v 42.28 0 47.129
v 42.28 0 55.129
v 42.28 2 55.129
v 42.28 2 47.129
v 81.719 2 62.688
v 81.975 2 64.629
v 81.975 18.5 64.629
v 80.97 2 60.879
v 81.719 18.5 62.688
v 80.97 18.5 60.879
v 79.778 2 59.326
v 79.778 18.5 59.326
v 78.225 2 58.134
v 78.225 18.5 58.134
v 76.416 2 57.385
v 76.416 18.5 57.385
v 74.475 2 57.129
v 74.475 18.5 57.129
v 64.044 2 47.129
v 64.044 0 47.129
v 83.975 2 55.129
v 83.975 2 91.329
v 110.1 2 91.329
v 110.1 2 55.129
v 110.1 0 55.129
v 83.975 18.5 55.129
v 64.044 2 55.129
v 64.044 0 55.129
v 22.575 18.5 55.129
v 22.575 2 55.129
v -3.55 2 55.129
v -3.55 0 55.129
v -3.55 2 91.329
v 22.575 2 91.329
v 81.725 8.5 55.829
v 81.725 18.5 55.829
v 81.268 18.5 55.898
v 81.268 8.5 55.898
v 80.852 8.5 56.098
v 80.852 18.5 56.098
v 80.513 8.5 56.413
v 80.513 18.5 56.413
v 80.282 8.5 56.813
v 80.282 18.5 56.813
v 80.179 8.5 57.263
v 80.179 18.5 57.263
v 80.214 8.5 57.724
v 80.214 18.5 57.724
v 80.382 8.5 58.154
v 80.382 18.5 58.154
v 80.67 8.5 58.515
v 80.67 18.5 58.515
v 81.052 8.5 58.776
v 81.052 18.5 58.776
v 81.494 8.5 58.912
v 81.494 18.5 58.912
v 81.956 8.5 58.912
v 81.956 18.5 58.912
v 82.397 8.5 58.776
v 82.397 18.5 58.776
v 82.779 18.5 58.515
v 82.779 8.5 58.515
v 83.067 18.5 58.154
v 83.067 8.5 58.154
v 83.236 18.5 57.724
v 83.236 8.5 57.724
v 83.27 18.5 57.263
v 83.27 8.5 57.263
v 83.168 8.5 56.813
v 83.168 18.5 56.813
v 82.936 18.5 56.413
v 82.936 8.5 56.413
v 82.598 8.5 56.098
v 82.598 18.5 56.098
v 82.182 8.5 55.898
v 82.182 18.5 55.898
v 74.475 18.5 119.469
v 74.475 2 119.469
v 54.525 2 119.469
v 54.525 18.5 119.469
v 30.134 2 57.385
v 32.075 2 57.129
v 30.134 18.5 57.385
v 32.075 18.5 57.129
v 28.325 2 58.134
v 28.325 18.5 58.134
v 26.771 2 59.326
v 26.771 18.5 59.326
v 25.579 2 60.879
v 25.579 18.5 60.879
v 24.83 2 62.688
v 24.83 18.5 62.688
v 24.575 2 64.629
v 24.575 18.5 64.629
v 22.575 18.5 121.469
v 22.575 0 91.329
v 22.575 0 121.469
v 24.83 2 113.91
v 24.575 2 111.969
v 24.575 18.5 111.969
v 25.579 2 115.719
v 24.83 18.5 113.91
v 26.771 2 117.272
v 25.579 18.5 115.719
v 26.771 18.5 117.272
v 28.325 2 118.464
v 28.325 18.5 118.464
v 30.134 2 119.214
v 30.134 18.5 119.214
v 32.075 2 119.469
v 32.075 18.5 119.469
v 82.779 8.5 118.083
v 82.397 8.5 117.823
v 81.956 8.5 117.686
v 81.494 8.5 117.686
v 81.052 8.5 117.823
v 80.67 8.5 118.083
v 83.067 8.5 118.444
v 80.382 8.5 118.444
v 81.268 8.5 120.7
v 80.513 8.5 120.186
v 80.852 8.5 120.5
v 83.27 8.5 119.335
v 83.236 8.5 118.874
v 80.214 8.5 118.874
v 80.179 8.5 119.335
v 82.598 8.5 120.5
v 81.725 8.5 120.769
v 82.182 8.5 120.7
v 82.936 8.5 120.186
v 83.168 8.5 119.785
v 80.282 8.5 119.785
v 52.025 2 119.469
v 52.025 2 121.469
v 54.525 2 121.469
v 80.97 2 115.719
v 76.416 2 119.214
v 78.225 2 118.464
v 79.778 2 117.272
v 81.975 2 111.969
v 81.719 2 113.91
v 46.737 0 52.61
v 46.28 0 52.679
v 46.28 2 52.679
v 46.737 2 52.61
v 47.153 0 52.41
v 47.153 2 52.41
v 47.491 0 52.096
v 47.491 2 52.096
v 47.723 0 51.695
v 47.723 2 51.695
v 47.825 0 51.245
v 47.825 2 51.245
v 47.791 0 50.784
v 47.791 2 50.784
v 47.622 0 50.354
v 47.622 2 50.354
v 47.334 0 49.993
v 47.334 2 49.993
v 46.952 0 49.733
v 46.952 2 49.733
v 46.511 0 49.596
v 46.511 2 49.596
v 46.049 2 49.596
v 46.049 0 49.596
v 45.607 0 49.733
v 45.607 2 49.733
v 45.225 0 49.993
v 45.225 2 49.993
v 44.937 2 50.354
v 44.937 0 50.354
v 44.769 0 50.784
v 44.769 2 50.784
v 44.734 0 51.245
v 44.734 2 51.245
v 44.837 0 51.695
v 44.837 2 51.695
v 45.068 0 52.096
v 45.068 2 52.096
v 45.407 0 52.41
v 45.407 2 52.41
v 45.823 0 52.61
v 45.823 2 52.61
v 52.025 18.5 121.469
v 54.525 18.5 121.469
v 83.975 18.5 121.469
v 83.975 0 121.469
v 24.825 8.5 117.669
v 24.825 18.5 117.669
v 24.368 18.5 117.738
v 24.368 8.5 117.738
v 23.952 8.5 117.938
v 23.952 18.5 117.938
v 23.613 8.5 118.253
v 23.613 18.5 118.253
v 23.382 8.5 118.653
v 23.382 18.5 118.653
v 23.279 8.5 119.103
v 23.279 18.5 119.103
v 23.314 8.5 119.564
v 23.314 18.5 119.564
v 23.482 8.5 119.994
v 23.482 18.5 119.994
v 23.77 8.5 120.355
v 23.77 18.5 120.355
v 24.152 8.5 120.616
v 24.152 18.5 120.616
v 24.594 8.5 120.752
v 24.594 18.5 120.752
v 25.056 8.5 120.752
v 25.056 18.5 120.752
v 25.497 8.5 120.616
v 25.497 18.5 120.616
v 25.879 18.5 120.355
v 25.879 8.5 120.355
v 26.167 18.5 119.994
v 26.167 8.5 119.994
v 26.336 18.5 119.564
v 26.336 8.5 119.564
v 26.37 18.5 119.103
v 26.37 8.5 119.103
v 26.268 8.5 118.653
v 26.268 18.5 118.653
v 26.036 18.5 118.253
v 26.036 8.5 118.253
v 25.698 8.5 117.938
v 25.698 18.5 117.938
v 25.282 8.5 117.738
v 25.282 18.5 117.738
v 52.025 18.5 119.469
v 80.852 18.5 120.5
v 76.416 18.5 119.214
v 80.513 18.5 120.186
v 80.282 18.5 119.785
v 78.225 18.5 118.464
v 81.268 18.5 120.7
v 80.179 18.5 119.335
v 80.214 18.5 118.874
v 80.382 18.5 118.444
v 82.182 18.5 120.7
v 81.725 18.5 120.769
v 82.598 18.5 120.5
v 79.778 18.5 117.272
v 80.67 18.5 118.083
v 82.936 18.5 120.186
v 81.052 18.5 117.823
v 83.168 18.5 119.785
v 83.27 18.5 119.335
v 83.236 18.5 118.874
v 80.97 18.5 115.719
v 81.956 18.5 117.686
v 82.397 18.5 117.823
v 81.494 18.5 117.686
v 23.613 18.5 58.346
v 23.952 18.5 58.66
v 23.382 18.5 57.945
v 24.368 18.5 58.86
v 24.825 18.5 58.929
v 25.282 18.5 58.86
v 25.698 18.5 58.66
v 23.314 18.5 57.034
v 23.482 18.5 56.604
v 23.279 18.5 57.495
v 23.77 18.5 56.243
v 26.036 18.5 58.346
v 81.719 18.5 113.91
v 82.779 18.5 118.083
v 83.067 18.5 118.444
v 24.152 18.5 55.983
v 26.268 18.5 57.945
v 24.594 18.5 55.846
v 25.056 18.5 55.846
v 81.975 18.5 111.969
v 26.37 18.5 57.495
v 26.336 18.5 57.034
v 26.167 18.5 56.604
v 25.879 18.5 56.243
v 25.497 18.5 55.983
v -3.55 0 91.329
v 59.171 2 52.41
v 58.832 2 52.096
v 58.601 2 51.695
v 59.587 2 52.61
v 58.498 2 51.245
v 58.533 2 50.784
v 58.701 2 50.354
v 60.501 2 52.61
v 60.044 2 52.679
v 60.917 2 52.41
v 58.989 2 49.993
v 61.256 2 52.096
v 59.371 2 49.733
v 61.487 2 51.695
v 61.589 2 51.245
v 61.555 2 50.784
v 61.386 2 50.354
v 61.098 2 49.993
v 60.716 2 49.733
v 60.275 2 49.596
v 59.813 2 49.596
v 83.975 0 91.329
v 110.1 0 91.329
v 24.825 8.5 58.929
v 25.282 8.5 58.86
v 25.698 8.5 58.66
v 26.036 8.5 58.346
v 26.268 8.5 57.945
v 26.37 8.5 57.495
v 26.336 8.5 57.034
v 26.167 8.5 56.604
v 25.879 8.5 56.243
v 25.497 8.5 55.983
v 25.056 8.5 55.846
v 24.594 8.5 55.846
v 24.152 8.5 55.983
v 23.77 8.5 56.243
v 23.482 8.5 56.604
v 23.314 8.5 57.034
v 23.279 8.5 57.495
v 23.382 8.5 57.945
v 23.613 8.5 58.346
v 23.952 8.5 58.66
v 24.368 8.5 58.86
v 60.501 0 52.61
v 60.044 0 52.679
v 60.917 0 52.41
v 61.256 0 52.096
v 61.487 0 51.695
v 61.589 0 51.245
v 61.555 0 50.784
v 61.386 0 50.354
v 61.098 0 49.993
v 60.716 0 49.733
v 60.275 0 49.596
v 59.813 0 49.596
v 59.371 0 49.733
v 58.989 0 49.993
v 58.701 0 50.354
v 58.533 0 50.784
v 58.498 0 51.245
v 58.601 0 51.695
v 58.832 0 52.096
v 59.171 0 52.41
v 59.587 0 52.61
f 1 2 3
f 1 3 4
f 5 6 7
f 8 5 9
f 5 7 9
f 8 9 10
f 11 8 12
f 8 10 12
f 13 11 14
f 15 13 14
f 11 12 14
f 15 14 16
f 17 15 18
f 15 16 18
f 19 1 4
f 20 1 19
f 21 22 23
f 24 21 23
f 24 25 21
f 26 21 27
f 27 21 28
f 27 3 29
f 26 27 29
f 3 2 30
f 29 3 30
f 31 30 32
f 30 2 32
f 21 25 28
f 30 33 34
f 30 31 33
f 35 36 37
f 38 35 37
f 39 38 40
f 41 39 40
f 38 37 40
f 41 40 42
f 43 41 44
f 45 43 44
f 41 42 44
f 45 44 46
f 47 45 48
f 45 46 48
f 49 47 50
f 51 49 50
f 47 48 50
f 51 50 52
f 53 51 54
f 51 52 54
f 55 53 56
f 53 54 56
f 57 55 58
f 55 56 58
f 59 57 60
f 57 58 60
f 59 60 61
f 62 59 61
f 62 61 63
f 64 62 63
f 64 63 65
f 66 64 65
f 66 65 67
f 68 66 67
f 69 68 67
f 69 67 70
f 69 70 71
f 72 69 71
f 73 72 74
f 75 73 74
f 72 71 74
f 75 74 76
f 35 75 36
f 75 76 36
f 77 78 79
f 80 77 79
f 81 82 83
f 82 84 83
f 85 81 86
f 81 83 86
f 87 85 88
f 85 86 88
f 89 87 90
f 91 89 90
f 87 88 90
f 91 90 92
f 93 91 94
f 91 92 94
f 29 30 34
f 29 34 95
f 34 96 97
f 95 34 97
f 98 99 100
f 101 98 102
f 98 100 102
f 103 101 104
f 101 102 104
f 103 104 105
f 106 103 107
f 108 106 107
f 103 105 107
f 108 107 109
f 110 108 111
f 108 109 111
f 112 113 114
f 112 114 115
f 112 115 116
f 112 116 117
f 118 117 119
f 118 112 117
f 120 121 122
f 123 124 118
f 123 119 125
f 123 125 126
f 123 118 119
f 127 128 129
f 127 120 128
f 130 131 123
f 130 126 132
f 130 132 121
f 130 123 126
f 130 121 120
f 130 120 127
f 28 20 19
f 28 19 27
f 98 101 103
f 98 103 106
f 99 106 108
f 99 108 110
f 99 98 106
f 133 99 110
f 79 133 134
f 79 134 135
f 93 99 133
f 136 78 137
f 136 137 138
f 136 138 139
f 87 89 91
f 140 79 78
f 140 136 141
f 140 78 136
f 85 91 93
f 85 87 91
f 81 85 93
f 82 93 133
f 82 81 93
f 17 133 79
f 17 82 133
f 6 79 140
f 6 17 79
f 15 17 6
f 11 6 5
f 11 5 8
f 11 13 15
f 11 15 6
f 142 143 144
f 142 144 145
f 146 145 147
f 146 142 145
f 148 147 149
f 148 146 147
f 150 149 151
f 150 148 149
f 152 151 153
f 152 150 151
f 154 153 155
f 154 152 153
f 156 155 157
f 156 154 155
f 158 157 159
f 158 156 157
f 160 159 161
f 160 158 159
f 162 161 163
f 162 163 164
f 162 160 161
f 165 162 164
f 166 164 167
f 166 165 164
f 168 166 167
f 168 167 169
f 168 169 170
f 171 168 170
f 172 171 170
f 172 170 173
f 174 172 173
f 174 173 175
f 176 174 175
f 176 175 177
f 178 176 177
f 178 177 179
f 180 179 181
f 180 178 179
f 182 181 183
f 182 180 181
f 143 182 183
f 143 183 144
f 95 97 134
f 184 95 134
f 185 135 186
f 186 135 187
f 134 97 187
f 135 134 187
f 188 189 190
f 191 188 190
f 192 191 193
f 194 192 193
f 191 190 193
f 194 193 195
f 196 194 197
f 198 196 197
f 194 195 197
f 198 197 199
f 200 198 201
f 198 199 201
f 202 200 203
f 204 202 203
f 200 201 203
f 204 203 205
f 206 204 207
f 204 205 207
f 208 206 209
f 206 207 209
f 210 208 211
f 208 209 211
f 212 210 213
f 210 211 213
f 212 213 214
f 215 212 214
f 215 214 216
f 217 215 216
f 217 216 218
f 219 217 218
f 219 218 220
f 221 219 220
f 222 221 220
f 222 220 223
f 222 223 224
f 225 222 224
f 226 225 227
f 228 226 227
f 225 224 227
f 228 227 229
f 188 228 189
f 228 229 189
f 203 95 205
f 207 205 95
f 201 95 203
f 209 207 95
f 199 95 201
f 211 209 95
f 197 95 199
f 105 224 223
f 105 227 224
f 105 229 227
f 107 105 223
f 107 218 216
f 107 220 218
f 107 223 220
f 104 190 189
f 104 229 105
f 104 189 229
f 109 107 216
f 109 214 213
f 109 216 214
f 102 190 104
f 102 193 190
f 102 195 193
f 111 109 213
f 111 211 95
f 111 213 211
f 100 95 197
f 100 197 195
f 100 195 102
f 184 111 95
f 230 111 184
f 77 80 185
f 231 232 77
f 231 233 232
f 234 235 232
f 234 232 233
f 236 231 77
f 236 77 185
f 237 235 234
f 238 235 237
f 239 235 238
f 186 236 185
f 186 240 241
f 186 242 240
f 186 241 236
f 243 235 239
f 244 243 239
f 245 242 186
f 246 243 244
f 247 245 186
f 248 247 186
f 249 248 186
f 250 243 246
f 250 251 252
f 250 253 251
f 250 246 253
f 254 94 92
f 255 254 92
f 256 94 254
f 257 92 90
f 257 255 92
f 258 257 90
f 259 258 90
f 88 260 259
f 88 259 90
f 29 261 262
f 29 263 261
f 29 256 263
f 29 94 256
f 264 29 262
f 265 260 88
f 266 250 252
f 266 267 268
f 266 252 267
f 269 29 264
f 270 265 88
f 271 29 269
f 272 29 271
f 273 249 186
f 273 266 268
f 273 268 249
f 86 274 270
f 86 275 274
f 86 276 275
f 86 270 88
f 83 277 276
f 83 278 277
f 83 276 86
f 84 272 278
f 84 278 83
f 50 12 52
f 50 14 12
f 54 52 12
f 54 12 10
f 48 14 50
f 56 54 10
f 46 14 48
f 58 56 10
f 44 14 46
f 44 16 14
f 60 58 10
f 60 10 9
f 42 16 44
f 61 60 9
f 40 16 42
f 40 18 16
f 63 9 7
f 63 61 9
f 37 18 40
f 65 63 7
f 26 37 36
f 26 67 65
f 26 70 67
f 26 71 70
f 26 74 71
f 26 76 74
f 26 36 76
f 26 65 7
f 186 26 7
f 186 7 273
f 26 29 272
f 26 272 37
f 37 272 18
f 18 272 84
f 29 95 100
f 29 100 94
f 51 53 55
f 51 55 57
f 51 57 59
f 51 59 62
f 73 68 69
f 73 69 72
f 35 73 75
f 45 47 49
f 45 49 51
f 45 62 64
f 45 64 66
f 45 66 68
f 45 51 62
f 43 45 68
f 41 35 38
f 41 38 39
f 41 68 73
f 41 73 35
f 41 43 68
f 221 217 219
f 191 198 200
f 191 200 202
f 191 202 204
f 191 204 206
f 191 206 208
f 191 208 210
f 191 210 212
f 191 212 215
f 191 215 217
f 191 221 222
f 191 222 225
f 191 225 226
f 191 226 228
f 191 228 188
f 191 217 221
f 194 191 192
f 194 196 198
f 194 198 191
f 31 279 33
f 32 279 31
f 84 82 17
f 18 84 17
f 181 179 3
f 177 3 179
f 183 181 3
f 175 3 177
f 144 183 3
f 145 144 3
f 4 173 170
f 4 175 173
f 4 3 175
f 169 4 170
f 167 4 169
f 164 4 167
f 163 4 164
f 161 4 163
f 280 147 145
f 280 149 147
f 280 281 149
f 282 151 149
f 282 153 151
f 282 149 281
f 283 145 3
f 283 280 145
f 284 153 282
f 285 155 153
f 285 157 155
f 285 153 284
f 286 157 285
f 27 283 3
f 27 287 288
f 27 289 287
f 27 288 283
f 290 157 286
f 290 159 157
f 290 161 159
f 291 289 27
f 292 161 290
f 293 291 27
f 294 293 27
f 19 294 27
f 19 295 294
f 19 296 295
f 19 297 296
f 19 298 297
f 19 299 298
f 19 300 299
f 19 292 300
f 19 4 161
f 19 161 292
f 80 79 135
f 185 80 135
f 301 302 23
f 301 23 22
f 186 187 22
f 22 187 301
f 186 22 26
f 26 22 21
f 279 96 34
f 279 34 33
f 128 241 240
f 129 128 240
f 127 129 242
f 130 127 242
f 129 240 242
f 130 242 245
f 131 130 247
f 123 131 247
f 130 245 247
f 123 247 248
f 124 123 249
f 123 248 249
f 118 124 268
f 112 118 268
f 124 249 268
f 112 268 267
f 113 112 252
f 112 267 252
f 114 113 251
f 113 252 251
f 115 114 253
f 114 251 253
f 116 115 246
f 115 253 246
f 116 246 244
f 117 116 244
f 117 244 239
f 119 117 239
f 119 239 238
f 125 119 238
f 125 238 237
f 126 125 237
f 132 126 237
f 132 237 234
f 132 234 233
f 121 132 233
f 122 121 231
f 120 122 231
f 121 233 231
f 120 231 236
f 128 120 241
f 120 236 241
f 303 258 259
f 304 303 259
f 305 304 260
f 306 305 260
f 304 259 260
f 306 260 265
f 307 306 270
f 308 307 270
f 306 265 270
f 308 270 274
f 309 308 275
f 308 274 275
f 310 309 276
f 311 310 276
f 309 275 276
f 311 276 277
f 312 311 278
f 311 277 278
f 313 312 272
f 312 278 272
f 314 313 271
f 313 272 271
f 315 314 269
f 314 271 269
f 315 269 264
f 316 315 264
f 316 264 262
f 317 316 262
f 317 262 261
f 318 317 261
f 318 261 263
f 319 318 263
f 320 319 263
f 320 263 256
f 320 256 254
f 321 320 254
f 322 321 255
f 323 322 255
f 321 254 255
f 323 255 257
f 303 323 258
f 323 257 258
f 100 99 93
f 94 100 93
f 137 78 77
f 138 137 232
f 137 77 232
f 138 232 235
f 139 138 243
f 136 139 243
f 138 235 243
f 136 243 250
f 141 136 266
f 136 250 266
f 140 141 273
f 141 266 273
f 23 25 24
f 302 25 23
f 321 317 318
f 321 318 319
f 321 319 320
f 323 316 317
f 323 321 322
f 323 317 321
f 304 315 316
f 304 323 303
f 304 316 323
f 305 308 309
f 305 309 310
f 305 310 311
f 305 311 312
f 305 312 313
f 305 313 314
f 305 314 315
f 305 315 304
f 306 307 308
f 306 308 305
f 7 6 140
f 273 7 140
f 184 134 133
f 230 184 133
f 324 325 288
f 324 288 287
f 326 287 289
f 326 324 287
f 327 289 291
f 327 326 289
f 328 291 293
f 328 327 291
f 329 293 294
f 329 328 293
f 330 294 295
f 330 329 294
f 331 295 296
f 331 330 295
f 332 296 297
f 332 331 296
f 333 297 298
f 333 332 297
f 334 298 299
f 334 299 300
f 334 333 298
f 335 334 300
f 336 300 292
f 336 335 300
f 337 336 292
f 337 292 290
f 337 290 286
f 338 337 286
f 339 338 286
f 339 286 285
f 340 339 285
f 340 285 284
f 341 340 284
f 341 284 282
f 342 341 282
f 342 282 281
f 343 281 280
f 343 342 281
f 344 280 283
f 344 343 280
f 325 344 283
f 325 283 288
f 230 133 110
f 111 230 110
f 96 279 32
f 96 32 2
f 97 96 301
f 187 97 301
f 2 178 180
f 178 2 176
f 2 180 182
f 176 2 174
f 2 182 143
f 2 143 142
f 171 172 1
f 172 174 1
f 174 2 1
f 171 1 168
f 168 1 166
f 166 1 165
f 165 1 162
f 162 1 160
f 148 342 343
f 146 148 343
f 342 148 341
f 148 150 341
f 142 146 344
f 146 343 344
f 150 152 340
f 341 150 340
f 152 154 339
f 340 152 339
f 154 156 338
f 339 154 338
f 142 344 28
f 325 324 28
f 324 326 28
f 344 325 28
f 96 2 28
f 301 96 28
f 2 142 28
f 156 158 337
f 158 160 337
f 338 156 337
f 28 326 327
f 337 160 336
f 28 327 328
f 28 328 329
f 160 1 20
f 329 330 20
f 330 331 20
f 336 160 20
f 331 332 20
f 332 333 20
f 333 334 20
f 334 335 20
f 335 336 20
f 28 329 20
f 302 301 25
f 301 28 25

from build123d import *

# Parameters (mm, degrees)
SKETCH1_R           = 1.55
SKETCH1_W           = 61.4
SKETCH1_H           = 66.34
BOSS_EXTRUDE1_DEPTH = 2
BOSS_EXTRUDE2_DEPTH = 16.5
FILLET1_R           = 7.5
SKETCH3_R           = 1.55
CUT_EXTRUDE1_DEPTH  = 10


with BuildPart() as part:
    # Sketch1 → Boss-Extrude1 (new body)
    # profile 1 of 2: a face of its own
    with BuildSketch(Plane(origin=(0, 0, 0), x_dir=(1, 0, 0), z_dir=(0, 1, 0))):
        Polygon((42.27964617, -55.129137945), (42.27964617, -47.129137945), (64.04371989, -47.129137945), (64.04371989, -55.129137945), (110.09964617, -55.129137945), (110.09964617, -91.329137945), (-3.55035383, -91.329137945), (-3.55035383, -55.129137945), align=None)
        with Locations(Location((46.27964617, -51.129137945, 0), (0, 0, 270))):
            Circle(SKETCH1_R, mode=Mode.SUBTRACT)
        with Locations(Location((60.04371989, -51.129137945, 0), (0, 0, 270))):
            Circle(SKETCH1_R, mode=Mode.SUBTRACT)
    # profile 2 of 2: a face of its own
    with BuildSketch(Plane(origin=(0, 0, 0), x_dir=(1, 0, 0), z_dir=(0, 1, 0))):
        with Locations((53.27464617, -88.299137945)):
            Rectangle(SKETCH1_W, SKETCH1_H)
    extrude(amount=BOSS_EXTRUDE1_DEPTH)

    # Sketch2 → Boss-Extrude2 (add)
    with BuildSketch(Plane(origin=(0, 2, 0), x_dir=(1, 0, 0), z_dir=(0, 1, 0))):
        Polygon((22.57464617, -91.329137945), (22.57464617, -121.469137945), (52.02464617, -121.469137945), (52.02464617, -119.469137945), (24.57464617, -119.469137945), (24.57464617, -57.129137945), (81.97464617, -57.129137945), (81.97464617, -119.469137945), (54.52464617, -119.469137945), (54.52464617, -121.469137945), (83.97464617, -121.469137945), (83.97464617, -91.329137945), (83.97464617, -55.129137945), (64.04371989, -55.129137945), (42.27964617, -55.129137945), (22.57464617, -55.129137945), align=None)
    extrude(amount=BOSS_EXTRUDE2_DEPTH)

    # Fillet1
    fillet1_edges = [part.edges().sort_by_distance(p)[0] for p in [
        (81.97464617, 10.25, 119.469137945),
        (24.57464617, 10.25, 119.469137945),
        (24.57464617, 10.25, 57.129137945),
        (81.97464617, 10.25, 57.129137945),
    ]]
    fillet(fillet1_edges, radius=FILLET1_R)

    # Sketch3 → Cut-Extrude1 (cut)
    with BuildSketch(Plane(origin=(0, 18.5, 0), x_dir=(1, 0, 0), z_dir=(0, 1, 0))):
        with Locations(Location((24.82464617, -57.379137945, 0), (0, 0, 270))):
            Circle(SKETCH3_R)
        with Locations(Location((81.72464617, -57.379137945, 0), (0, 0, 90))):
            Circle(SKETCH3_R)
        with Locations(Location((81.72464617, -119.219137945, 0), (0, 0, 270))):
            Circle(SKETCH3_R)
        with Locations(Location((24.82464617, -119.219137945, 0), (0, 0, 90))):
            Circle(SKETCH3_R)
    extrude(amount=-CUT_EXTRUDE1_DEPTH, mode=Mode.SUBTRACT)


solid = part.part
